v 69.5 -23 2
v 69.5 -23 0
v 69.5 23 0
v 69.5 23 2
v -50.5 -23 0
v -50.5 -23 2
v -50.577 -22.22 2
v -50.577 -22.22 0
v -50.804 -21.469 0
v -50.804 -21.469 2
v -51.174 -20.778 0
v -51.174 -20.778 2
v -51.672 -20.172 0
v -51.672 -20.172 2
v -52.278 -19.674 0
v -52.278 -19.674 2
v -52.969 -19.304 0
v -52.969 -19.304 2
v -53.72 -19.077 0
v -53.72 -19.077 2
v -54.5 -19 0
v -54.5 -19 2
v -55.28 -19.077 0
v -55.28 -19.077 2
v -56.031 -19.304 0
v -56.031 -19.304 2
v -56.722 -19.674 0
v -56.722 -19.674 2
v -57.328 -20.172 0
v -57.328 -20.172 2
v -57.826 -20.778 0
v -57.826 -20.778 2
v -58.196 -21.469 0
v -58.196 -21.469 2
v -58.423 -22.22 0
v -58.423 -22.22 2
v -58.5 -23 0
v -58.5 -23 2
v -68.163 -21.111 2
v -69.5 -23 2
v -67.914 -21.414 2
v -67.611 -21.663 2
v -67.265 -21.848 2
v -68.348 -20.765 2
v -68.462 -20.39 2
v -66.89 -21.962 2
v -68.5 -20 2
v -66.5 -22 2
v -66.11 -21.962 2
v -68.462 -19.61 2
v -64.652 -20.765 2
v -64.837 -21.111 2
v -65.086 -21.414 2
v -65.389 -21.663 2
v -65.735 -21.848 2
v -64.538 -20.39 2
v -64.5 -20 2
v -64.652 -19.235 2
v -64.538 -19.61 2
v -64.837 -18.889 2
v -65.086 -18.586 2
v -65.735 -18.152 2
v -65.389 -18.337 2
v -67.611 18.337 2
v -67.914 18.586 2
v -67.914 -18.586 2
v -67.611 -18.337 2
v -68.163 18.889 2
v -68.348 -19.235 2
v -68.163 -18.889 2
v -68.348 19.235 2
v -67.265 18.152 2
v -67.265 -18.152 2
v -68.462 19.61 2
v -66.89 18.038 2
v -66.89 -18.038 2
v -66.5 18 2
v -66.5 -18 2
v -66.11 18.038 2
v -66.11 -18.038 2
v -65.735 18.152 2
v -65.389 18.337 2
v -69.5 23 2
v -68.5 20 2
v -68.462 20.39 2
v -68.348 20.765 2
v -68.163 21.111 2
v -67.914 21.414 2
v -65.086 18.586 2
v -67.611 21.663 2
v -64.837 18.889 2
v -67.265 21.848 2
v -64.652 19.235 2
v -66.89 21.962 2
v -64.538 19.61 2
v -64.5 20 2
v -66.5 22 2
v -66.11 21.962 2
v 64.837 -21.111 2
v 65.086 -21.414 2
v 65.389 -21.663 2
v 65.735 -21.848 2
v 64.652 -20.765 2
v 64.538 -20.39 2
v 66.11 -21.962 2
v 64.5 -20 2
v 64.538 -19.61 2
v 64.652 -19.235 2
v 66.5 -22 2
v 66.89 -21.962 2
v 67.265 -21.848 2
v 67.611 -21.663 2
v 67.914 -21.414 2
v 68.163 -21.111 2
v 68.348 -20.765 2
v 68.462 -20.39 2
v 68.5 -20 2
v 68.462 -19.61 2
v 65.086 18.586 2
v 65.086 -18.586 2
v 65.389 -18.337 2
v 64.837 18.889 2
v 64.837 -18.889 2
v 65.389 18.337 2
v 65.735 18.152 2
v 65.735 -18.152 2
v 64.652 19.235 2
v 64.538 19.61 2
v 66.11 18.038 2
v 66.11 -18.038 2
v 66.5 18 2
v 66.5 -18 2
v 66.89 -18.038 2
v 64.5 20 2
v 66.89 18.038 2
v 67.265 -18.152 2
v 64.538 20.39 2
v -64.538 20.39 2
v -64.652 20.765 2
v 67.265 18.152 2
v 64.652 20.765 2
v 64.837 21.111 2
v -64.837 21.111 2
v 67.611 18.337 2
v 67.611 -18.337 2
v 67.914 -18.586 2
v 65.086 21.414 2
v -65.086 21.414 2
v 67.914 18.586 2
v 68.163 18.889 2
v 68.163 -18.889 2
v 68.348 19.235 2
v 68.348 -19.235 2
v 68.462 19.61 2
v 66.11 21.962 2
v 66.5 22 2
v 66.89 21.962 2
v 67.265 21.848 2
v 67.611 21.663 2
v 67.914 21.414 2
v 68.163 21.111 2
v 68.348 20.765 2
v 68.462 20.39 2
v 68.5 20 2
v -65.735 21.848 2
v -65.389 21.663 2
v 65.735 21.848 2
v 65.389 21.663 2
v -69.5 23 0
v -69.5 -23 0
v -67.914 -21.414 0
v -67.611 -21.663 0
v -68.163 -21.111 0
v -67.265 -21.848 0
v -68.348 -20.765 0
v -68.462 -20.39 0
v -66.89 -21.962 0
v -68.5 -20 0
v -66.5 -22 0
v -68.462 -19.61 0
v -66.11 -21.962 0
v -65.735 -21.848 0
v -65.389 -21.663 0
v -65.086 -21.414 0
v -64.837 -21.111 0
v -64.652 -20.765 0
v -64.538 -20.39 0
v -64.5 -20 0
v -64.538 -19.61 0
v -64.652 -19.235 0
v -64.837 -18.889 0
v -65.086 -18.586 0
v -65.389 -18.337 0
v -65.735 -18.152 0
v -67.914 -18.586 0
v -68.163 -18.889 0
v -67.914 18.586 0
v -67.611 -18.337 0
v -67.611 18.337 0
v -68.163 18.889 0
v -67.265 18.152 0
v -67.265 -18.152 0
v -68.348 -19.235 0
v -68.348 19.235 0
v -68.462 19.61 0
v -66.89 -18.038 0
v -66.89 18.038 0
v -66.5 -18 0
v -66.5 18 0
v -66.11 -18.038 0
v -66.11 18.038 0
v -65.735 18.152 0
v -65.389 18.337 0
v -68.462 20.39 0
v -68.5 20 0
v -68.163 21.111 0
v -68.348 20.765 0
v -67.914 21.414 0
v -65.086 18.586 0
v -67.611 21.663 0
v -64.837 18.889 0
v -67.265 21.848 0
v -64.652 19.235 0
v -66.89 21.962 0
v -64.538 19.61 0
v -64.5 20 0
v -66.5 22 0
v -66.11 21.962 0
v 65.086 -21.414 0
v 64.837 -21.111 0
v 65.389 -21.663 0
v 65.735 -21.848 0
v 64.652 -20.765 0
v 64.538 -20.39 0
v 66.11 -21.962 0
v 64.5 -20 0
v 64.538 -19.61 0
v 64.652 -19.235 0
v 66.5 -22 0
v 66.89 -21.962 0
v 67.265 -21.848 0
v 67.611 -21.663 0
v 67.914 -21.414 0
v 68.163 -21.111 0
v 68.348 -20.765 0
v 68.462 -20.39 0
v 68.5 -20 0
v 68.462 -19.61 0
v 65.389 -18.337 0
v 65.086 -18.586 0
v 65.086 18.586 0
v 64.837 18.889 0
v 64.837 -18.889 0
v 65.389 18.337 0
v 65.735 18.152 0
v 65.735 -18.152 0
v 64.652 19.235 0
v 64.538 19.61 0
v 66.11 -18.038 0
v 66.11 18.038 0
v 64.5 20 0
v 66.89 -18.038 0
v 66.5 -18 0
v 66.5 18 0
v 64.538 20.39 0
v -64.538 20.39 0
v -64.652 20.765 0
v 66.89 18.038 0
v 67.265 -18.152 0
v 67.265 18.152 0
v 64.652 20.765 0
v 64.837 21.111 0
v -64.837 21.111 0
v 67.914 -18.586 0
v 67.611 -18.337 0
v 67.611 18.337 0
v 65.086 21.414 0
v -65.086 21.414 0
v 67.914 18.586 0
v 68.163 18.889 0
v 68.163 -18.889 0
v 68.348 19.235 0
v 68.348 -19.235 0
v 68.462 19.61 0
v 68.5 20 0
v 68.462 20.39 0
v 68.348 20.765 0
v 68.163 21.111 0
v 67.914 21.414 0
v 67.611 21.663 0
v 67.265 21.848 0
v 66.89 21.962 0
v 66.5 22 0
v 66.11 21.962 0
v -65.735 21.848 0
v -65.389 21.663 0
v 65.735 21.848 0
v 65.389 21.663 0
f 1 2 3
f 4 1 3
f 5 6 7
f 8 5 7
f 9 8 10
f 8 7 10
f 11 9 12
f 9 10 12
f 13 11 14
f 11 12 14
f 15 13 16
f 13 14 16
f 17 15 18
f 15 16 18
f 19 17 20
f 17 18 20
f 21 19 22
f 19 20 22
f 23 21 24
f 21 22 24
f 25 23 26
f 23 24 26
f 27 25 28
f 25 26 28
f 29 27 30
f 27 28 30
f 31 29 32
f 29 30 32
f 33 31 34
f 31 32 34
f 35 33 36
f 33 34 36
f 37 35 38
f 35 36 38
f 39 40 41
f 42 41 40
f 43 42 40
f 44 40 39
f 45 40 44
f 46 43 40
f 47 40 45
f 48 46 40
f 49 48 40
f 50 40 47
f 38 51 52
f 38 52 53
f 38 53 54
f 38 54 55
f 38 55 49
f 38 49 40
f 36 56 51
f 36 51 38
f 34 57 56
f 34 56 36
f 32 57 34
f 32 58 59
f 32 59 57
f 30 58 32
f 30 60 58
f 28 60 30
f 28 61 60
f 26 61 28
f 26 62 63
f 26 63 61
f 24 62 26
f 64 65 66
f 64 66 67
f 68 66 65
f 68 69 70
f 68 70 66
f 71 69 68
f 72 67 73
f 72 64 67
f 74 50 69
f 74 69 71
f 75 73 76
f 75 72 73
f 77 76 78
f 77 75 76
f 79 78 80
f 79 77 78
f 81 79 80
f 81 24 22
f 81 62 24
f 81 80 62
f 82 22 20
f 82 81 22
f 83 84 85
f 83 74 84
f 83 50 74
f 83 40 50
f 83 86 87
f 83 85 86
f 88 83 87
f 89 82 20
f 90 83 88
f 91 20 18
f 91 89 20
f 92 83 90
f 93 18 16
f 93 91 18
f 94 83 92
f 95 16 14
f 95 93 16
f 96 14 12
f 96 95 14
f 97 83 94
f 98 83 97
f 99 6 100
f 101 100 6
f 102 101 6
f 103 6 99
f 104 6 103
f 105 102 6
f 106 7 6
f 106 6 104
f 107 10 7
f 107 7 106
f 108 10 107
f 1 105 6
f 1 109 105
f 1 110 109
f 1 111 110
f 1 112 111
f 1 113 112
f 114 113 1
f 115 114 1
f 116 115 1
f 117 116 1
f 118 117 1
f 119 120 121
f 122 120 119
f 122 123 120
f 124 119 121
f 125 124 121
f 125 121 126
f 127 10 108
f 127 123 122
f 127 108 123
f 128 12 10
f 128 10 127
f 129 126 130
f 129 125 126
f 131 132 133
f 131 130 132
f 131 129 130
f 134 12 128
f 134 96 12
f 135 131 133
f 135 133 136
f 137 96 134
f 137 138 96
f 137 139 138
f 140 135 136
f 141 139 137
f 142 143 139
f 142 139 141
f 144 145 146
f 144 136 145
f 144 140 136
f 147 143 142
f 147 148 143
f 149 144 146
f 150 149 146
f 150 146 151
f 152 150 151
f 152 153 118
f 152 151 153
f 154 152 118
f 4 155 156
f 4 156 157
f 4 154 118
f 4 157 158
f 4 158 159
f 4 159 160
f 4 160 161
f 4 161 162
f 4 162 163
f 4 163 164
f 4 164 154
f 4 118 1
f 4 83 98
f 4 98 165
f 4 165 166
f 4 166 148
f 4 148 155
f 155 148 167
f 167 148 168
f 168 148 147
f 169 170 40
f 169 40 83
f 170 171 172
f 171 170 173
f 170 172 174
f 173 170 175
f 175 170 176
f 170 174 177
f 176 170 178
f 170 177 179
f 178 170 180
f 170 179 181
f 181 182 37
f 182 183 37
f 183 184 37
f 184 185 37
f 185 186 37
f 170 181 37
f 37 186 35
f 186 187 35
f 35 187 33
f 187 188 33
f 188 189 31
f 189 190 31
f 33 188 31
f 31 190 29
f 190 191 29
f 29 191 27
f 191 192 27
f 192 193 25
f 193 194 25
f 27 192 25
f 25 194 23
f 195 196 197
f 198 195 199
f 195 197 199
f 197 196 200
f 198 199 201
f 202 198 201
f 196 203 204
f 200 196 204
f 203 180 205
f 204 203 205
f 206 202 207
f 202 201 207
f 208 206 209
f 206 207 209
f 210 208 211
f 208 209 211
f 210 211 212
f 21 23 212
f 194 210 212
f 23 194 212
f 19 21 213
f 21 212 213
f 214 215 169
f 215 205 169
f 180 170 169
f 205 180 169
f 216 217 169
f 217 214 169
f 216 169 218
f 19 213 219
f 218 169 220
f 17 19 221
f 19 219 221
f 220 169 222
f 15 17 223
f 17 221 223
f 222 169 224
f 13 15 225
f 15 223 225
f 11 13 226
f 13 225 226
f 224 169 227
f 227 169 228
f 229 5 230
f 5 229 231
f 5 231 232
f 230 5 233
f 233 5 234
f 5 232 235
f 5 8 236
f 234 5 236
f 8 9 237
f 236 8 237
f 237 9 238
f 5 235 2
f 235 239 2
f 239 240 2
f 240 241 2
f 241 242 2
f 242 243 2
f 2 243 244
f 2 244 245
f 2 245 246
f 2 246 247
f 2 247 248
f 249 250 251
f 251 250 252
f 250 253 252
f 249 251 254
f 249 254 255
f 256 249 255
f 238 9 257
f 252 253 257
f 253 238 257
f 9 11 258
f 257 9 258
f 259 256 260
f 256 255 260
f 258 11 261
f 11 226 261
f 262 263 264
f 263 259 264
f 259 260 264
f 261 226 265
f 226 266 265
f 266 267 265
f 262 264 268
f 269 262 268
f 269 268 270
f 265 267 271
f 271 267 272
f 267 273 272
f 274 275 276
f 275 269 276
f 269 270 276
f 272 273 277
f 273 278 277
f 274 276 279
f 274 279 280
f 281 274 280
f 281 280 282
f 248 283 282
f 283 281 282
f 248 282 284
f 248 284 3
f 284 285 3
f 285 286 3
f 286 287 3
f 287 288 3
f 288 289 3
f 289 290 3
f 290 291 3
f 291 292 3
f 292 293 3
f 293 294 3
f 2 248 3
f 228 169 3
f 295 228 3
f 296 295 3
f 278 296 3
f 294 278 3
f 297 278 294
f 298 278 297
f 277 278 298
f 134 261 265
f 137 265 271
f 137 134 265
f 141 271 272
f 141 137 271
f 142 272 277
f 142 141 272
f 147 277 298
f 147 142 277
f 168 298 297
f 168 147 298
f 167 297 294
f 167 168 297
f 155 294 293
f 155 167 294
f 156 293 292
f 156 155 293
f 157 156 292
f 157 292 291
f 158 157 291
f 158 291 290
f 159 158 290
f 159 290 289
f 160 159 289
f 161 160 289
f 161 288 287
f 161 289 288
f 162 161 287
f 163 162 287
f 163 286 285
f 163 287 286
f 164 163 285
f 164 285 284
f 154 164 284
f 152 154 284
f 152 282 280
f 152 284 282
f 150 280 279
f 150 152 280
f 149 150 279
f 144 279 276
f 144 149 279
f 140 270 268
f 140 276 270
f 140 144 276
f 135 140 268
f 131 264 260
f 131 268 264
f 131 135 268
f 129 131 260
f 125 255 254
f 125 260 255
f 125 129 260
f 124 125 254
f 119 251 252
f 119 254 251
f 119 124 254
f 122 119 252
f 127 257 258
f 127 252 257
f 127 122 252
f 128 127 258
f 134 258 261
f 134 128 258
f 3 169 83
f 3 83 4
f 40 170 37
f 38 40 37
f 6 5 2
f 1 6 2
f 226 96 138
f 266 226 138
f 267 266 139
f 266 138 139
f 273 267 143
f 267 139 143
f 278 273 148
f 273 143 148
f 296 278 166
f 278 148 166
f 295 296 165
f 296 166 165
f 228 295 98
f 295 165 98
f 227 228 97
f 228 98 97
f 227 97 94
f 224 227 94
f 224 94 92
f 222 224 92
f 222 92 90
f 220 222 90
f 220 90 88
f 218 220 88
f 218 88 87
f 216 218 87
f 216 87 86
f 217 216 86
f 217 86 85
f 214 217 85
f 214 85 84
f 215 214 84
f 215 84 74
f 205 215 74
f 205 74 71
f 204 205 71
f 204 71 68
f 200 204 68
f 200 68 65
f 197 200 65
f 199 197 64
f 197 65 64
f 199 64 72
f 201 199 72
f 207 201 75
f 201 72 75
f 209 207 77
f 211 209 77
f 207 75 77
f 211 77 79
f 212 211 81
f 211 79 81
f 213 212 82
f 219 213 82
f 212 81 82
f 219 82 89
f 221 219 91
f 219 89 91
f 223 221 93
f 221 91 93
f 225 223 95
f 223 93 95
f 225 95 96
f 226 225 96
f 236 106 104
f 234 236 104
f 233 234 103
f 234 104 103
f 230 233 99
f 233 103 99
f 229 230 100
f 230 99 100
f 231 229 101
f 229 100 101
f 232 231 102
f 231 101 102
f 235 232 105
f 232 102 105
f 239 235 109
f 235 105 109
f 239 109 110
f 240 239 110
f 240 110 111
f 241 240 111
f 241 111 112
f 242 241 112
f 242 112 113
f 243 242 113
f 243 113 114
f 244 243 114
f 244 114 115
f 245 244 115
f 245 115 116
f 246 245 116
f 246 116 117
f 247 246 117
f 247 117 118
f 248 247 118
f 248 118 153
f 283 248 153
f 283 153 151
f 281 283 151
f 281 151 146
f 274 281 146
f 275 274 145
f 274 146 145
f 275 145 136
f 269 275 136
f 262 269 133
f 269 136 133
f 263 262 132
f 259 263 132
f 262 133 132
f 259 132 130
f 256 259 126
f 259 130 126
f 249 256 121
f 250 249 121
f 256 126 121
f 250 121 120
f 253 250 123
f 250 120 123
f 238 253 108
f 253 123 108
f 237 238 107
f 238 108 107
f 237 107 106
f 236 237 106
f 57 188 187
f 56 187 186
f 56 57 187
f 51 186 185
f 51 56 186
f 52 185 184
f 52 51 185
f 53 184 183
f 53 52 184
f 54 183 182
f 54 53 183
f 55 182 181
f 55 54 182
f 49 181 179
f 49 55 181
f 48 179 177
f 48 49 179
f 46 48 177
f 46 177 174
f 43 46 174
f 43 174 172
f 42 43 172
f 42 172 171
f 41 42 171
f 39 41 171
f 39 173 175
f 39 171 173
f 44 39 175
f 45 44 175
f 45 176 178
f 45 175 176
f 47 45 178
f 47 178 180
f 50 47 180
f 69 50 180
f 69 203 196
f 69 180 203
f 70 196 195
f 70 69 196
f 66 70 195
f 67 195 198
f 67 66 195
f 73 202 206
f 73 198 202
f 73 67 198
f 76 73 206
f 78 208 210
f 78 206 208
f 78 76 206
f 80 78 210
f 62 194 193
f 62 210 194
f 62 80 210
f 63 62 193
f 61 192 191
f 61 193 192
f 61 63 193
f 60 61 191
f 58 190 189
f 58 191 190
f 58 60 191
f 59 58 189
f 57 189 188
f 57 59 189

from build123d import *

# Parameters (mm, degrees)
SKETCH_W                = 139
SKETCH_H                = 46
PAD_DEPTH               = 2
SKETCH001_R             = 2
POCKET_DEPTH            = 294.855913
SKETCH001_MIRRORED_2_R  = 2
POCKET_MIRRORED_2_DEPTH = 294.855913
POCKET001_DEPTH         = 2.001


with BuildPart() as part:
    # Sketch → Pad (new body)
    with BuildSketch(Plane.XY):
        Rectangle(SKETCH_W, SKETCH_H)
    extrude(amount=PAD_DEPTH)

    # Sketch001 (on Face6 of Pad) → Pocket (cut, through all)
    with BuildSketch(Plane.XY.offset(2)):
        with Locations((-66.5, 20)):
            Circle(SKETCH001_R)
    pocket = extrude(amount=-POCKET_DEPTH, mode=Mode.SUBTRACT)

    # Sketch001 Mirrored 2 → Pocket Mirrored 2 (cut, through all)
    with BuildSketch(Plane(origin=(0, 0, 2), x_dir=(-1, 0, 0), z_dir=(0, 0, -1))):
        with Locations((-66.5, 20)):
            Circle(SKETCH001_MIRRORED_2_R)
    pocket_mirrored_2 = extrude(amount=POCKET_MIRRORED_2_DEPTH, mode=Mode.SUBTRACT)

    # Mirrored001: Pocket, Pocket Mirrored 2 across Sketch001 H_Axis
    add(pocket.mirror(Plane(origin=(0, 0, 2), x_dir=(0, 0, 1), z_dir=(0, 1, 0))), mode=Mode.SUBTRACT)
    add(pocket_mirrored_2.mirror(Plane(origin=(0, 0, 2), x_dir=(0, 0, 1), z_dir=(0, 1, 0))), mode=Mode.SUBTRACT)

    # Sketch002 (on Face5 of MultiTransform) → Pocket001 (cut, through all)
    with BuildSketch(Plane.XY.offset(2)):
        with BuildLine():
            ThreePointArc((-50.5, -23), (-54.5, -19), (-58.5, -23))
            Line((-58.5, -23), (-50.5, -23))
        make_face()
    extrude(amount=-POCKET001_DEPTH, mode=Mode.SUBTRACT)


solid = part.part
